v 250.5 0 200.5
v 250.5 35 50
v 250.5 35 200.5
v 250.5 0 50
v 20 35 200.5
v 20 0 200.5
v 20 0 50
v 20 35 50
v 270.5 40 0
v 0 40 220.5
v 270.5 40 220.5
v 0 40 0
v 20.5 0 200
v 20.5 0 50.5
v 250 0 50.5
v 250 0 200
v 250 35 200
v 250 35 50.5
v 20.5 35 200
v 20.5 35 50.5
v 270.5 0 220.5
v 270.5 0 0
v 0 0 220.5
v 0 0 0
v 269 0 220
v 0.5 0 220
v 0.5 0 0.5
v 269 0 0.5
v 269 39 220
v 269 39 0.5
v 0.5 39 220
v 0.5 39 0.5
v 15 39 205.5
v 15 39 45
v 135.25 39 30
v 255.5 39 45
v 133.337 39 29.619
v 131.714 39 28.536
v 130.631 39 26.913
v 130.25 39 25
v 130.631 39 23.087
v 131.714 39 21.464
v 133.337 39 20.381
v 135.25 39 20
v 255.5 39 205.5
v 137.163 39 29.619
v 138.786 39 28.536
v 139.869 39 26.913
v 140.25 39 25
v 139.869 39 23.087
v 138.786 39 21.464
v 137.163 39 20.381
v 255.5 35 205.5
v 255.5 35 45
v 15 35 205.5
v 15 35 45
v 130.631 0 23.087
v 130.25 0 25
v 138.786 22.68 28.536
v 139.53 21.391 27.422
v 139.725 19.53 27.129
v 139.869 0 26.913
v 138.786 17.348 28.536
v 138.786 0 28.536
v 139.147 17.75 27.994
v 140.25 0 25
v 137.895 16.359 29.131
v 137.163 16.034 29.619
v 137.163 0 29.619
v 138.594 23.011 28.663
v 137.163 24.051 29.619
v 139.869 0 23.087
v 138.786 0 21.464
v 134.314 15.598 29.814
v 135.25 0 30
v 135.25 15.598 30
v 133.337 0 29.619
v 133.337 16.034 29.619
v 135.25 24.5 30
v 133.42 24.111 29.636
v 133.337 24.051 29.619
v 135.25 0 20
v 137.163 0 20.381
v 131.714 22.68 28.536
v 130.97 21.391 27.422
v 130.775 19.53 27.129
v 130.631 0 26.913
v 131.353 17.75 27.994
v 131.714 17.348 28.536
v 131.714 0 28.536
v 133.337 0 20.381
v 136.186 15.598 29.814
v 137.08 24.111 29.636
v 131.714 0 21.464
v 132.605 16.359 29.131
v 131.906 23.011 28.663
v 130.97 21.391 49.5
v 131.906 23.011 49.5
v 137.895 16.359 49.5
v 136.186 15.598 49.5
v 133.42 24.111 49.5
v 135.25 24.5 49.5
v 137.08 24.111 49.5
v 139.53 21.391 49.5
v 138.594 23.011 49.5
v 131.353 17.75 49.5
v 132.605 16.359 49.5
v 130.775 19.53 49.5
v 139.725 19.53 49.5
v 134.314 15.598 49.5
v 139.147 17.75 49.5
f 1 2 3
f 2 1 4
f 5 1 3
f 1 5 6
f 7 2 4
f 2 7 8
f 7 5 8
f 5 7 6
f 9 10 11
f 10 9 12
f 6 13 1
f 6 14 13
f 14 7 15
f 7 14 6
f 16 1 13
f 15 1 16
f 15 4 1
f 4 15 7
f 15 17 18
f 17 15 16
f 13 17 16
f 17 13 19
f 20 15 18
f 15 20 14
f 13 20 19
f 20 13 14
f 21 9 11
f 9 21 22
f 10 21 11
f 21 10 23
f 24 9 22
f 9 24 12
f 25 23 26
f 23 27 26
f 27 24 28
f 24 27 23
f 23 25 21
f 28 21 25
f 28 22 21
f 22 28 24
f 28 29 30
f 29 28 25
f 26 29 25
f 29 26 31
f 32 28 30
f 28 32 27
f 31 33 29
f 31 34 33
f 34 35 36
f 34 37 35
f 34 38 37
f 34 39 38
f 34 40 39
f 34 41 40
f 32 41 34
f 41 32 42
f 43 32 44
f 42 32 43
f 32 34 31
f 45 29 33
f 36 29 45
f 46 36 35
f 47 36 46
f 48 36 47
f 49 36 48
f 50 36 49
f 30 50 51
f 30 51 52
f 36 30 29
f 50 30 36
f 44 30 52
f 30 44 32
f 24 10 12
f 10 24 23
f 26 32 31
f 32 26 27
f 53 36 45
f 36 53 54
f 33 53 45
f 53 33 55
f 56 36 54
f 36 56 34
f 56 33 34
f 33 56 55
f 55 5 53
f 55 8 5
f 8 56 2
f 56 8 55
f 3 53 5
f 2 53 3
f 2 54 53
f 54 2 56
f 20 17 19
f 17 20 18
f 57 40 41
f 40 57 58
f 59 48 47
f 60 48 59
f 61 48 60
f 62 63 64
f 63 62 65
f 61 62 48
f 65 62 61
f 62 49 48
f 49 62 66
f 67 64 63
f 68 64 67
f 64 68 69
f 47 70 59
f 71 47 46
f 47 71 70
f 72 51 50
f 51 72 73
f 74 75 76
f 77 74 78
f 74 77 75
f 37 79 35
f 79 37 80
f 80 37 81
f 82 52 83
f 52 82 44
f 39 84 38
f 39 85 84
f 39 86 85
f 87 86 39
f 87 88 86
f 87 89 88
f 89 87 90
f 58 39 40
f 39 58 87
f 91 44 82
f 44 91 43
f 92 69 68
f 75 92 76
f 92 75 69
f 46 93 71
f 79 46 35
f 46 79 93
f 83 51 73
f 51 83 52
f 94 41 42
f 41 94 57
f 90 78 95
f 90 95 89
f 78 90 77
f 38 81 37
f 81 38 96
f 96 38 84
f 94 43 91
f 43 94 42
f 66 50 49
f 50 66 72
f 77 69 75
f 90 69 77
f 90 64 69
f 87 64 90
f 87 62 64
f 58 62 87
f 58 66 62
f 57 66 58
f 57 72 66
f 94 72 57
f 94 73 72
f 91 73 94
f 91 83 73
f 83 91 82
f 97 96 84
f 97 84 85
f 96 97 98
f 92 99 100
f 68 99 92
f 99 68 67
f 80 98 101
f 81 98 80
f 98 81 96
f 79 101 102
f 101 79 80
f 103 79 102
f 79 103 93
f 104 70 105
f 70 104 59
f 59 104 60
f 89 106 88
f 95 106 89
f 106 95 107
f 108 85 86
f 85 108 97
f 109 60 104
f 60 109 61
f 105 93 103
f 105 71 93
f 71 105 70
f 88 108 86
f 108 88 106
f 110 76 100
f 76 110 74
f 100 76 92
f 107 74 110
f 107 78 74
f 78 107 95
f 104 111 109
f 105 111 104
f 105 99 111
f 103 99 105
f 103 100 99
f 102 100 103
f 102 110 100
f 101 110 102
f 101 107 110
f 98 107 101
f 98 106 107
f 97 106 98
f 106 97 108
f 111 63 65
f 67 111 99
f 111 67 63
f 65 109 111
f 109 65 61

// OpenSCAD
module wand(w, t, h) {
  difference() {  
    cube([w, t, h]);
    translate([0.5, -1, 0.5])cube([w-1, t, h-1]);      
  }
}

module wandLeft(w, t, h) {
  difference() {  
    cube([w, t, h]);
    translate([-0.5, -1, 0.5])cube([w - 1, t, h-1]);      
  }
}

module wandRight(w, t, h) {
  difference() {  
    cube([w, t, h]);
    translate([0.5, -1, 0.5])cube([w, t, h-1]);      
  }
}

module wandTop(w, t, h) {
  difference() {  
    cube([w, t, h]);
    translate([0.5, -1, -0.5])cube([w - 1, t, h]);      
  }
}

module wandBottom(w, t, h) {
  difference() {  
    cube([w, t, h]);
    translate([0.5, -1, 0.5])cube([w - 1, t, h]);      
  }
}

h = 160;
dh = 150.5;
dw = 230.5;
wall_thick = 20;
module shell(lift) {
translate([wall_thick,0, lift+wall_thick]) wand(dw, 40, dh);

translate([dw+wall_thick, 0, 0]) wandLeft(wall_thick, 40, dh+(2*wall_thick) + lift);
translate([0, 0, 0]) wandRight(wall_thick, 40, dh+(2*wall_thick + lift));

translate([0, 0, lift + dh + (wall_thick)]) wandTop(dw + wall_thick*2, 40, wall_thick);

translate([0, 0, 0]) wandBottom(dw + wall_thick*2, 40, lift+wall_thick);
    
translate([wall_thick-5, 35, lift+wall_thick-5]) cube([dw+10, 5, dh+10]);

}


shell(30);
translate([(wall_thick*2 + dw)/2, 20, 50/2])rotate([90, 0, 0])cylinder(h=40, d = 10, center = true);
color("red")translate([(wall_thick*2 + dw)/2, 20, 37])rotate([0, 0, 90])cylinder(h=25, d = 9, center = true);

//translate([0, -55, 0])wandBottom(dw+(wall_thick*2),60,20);
